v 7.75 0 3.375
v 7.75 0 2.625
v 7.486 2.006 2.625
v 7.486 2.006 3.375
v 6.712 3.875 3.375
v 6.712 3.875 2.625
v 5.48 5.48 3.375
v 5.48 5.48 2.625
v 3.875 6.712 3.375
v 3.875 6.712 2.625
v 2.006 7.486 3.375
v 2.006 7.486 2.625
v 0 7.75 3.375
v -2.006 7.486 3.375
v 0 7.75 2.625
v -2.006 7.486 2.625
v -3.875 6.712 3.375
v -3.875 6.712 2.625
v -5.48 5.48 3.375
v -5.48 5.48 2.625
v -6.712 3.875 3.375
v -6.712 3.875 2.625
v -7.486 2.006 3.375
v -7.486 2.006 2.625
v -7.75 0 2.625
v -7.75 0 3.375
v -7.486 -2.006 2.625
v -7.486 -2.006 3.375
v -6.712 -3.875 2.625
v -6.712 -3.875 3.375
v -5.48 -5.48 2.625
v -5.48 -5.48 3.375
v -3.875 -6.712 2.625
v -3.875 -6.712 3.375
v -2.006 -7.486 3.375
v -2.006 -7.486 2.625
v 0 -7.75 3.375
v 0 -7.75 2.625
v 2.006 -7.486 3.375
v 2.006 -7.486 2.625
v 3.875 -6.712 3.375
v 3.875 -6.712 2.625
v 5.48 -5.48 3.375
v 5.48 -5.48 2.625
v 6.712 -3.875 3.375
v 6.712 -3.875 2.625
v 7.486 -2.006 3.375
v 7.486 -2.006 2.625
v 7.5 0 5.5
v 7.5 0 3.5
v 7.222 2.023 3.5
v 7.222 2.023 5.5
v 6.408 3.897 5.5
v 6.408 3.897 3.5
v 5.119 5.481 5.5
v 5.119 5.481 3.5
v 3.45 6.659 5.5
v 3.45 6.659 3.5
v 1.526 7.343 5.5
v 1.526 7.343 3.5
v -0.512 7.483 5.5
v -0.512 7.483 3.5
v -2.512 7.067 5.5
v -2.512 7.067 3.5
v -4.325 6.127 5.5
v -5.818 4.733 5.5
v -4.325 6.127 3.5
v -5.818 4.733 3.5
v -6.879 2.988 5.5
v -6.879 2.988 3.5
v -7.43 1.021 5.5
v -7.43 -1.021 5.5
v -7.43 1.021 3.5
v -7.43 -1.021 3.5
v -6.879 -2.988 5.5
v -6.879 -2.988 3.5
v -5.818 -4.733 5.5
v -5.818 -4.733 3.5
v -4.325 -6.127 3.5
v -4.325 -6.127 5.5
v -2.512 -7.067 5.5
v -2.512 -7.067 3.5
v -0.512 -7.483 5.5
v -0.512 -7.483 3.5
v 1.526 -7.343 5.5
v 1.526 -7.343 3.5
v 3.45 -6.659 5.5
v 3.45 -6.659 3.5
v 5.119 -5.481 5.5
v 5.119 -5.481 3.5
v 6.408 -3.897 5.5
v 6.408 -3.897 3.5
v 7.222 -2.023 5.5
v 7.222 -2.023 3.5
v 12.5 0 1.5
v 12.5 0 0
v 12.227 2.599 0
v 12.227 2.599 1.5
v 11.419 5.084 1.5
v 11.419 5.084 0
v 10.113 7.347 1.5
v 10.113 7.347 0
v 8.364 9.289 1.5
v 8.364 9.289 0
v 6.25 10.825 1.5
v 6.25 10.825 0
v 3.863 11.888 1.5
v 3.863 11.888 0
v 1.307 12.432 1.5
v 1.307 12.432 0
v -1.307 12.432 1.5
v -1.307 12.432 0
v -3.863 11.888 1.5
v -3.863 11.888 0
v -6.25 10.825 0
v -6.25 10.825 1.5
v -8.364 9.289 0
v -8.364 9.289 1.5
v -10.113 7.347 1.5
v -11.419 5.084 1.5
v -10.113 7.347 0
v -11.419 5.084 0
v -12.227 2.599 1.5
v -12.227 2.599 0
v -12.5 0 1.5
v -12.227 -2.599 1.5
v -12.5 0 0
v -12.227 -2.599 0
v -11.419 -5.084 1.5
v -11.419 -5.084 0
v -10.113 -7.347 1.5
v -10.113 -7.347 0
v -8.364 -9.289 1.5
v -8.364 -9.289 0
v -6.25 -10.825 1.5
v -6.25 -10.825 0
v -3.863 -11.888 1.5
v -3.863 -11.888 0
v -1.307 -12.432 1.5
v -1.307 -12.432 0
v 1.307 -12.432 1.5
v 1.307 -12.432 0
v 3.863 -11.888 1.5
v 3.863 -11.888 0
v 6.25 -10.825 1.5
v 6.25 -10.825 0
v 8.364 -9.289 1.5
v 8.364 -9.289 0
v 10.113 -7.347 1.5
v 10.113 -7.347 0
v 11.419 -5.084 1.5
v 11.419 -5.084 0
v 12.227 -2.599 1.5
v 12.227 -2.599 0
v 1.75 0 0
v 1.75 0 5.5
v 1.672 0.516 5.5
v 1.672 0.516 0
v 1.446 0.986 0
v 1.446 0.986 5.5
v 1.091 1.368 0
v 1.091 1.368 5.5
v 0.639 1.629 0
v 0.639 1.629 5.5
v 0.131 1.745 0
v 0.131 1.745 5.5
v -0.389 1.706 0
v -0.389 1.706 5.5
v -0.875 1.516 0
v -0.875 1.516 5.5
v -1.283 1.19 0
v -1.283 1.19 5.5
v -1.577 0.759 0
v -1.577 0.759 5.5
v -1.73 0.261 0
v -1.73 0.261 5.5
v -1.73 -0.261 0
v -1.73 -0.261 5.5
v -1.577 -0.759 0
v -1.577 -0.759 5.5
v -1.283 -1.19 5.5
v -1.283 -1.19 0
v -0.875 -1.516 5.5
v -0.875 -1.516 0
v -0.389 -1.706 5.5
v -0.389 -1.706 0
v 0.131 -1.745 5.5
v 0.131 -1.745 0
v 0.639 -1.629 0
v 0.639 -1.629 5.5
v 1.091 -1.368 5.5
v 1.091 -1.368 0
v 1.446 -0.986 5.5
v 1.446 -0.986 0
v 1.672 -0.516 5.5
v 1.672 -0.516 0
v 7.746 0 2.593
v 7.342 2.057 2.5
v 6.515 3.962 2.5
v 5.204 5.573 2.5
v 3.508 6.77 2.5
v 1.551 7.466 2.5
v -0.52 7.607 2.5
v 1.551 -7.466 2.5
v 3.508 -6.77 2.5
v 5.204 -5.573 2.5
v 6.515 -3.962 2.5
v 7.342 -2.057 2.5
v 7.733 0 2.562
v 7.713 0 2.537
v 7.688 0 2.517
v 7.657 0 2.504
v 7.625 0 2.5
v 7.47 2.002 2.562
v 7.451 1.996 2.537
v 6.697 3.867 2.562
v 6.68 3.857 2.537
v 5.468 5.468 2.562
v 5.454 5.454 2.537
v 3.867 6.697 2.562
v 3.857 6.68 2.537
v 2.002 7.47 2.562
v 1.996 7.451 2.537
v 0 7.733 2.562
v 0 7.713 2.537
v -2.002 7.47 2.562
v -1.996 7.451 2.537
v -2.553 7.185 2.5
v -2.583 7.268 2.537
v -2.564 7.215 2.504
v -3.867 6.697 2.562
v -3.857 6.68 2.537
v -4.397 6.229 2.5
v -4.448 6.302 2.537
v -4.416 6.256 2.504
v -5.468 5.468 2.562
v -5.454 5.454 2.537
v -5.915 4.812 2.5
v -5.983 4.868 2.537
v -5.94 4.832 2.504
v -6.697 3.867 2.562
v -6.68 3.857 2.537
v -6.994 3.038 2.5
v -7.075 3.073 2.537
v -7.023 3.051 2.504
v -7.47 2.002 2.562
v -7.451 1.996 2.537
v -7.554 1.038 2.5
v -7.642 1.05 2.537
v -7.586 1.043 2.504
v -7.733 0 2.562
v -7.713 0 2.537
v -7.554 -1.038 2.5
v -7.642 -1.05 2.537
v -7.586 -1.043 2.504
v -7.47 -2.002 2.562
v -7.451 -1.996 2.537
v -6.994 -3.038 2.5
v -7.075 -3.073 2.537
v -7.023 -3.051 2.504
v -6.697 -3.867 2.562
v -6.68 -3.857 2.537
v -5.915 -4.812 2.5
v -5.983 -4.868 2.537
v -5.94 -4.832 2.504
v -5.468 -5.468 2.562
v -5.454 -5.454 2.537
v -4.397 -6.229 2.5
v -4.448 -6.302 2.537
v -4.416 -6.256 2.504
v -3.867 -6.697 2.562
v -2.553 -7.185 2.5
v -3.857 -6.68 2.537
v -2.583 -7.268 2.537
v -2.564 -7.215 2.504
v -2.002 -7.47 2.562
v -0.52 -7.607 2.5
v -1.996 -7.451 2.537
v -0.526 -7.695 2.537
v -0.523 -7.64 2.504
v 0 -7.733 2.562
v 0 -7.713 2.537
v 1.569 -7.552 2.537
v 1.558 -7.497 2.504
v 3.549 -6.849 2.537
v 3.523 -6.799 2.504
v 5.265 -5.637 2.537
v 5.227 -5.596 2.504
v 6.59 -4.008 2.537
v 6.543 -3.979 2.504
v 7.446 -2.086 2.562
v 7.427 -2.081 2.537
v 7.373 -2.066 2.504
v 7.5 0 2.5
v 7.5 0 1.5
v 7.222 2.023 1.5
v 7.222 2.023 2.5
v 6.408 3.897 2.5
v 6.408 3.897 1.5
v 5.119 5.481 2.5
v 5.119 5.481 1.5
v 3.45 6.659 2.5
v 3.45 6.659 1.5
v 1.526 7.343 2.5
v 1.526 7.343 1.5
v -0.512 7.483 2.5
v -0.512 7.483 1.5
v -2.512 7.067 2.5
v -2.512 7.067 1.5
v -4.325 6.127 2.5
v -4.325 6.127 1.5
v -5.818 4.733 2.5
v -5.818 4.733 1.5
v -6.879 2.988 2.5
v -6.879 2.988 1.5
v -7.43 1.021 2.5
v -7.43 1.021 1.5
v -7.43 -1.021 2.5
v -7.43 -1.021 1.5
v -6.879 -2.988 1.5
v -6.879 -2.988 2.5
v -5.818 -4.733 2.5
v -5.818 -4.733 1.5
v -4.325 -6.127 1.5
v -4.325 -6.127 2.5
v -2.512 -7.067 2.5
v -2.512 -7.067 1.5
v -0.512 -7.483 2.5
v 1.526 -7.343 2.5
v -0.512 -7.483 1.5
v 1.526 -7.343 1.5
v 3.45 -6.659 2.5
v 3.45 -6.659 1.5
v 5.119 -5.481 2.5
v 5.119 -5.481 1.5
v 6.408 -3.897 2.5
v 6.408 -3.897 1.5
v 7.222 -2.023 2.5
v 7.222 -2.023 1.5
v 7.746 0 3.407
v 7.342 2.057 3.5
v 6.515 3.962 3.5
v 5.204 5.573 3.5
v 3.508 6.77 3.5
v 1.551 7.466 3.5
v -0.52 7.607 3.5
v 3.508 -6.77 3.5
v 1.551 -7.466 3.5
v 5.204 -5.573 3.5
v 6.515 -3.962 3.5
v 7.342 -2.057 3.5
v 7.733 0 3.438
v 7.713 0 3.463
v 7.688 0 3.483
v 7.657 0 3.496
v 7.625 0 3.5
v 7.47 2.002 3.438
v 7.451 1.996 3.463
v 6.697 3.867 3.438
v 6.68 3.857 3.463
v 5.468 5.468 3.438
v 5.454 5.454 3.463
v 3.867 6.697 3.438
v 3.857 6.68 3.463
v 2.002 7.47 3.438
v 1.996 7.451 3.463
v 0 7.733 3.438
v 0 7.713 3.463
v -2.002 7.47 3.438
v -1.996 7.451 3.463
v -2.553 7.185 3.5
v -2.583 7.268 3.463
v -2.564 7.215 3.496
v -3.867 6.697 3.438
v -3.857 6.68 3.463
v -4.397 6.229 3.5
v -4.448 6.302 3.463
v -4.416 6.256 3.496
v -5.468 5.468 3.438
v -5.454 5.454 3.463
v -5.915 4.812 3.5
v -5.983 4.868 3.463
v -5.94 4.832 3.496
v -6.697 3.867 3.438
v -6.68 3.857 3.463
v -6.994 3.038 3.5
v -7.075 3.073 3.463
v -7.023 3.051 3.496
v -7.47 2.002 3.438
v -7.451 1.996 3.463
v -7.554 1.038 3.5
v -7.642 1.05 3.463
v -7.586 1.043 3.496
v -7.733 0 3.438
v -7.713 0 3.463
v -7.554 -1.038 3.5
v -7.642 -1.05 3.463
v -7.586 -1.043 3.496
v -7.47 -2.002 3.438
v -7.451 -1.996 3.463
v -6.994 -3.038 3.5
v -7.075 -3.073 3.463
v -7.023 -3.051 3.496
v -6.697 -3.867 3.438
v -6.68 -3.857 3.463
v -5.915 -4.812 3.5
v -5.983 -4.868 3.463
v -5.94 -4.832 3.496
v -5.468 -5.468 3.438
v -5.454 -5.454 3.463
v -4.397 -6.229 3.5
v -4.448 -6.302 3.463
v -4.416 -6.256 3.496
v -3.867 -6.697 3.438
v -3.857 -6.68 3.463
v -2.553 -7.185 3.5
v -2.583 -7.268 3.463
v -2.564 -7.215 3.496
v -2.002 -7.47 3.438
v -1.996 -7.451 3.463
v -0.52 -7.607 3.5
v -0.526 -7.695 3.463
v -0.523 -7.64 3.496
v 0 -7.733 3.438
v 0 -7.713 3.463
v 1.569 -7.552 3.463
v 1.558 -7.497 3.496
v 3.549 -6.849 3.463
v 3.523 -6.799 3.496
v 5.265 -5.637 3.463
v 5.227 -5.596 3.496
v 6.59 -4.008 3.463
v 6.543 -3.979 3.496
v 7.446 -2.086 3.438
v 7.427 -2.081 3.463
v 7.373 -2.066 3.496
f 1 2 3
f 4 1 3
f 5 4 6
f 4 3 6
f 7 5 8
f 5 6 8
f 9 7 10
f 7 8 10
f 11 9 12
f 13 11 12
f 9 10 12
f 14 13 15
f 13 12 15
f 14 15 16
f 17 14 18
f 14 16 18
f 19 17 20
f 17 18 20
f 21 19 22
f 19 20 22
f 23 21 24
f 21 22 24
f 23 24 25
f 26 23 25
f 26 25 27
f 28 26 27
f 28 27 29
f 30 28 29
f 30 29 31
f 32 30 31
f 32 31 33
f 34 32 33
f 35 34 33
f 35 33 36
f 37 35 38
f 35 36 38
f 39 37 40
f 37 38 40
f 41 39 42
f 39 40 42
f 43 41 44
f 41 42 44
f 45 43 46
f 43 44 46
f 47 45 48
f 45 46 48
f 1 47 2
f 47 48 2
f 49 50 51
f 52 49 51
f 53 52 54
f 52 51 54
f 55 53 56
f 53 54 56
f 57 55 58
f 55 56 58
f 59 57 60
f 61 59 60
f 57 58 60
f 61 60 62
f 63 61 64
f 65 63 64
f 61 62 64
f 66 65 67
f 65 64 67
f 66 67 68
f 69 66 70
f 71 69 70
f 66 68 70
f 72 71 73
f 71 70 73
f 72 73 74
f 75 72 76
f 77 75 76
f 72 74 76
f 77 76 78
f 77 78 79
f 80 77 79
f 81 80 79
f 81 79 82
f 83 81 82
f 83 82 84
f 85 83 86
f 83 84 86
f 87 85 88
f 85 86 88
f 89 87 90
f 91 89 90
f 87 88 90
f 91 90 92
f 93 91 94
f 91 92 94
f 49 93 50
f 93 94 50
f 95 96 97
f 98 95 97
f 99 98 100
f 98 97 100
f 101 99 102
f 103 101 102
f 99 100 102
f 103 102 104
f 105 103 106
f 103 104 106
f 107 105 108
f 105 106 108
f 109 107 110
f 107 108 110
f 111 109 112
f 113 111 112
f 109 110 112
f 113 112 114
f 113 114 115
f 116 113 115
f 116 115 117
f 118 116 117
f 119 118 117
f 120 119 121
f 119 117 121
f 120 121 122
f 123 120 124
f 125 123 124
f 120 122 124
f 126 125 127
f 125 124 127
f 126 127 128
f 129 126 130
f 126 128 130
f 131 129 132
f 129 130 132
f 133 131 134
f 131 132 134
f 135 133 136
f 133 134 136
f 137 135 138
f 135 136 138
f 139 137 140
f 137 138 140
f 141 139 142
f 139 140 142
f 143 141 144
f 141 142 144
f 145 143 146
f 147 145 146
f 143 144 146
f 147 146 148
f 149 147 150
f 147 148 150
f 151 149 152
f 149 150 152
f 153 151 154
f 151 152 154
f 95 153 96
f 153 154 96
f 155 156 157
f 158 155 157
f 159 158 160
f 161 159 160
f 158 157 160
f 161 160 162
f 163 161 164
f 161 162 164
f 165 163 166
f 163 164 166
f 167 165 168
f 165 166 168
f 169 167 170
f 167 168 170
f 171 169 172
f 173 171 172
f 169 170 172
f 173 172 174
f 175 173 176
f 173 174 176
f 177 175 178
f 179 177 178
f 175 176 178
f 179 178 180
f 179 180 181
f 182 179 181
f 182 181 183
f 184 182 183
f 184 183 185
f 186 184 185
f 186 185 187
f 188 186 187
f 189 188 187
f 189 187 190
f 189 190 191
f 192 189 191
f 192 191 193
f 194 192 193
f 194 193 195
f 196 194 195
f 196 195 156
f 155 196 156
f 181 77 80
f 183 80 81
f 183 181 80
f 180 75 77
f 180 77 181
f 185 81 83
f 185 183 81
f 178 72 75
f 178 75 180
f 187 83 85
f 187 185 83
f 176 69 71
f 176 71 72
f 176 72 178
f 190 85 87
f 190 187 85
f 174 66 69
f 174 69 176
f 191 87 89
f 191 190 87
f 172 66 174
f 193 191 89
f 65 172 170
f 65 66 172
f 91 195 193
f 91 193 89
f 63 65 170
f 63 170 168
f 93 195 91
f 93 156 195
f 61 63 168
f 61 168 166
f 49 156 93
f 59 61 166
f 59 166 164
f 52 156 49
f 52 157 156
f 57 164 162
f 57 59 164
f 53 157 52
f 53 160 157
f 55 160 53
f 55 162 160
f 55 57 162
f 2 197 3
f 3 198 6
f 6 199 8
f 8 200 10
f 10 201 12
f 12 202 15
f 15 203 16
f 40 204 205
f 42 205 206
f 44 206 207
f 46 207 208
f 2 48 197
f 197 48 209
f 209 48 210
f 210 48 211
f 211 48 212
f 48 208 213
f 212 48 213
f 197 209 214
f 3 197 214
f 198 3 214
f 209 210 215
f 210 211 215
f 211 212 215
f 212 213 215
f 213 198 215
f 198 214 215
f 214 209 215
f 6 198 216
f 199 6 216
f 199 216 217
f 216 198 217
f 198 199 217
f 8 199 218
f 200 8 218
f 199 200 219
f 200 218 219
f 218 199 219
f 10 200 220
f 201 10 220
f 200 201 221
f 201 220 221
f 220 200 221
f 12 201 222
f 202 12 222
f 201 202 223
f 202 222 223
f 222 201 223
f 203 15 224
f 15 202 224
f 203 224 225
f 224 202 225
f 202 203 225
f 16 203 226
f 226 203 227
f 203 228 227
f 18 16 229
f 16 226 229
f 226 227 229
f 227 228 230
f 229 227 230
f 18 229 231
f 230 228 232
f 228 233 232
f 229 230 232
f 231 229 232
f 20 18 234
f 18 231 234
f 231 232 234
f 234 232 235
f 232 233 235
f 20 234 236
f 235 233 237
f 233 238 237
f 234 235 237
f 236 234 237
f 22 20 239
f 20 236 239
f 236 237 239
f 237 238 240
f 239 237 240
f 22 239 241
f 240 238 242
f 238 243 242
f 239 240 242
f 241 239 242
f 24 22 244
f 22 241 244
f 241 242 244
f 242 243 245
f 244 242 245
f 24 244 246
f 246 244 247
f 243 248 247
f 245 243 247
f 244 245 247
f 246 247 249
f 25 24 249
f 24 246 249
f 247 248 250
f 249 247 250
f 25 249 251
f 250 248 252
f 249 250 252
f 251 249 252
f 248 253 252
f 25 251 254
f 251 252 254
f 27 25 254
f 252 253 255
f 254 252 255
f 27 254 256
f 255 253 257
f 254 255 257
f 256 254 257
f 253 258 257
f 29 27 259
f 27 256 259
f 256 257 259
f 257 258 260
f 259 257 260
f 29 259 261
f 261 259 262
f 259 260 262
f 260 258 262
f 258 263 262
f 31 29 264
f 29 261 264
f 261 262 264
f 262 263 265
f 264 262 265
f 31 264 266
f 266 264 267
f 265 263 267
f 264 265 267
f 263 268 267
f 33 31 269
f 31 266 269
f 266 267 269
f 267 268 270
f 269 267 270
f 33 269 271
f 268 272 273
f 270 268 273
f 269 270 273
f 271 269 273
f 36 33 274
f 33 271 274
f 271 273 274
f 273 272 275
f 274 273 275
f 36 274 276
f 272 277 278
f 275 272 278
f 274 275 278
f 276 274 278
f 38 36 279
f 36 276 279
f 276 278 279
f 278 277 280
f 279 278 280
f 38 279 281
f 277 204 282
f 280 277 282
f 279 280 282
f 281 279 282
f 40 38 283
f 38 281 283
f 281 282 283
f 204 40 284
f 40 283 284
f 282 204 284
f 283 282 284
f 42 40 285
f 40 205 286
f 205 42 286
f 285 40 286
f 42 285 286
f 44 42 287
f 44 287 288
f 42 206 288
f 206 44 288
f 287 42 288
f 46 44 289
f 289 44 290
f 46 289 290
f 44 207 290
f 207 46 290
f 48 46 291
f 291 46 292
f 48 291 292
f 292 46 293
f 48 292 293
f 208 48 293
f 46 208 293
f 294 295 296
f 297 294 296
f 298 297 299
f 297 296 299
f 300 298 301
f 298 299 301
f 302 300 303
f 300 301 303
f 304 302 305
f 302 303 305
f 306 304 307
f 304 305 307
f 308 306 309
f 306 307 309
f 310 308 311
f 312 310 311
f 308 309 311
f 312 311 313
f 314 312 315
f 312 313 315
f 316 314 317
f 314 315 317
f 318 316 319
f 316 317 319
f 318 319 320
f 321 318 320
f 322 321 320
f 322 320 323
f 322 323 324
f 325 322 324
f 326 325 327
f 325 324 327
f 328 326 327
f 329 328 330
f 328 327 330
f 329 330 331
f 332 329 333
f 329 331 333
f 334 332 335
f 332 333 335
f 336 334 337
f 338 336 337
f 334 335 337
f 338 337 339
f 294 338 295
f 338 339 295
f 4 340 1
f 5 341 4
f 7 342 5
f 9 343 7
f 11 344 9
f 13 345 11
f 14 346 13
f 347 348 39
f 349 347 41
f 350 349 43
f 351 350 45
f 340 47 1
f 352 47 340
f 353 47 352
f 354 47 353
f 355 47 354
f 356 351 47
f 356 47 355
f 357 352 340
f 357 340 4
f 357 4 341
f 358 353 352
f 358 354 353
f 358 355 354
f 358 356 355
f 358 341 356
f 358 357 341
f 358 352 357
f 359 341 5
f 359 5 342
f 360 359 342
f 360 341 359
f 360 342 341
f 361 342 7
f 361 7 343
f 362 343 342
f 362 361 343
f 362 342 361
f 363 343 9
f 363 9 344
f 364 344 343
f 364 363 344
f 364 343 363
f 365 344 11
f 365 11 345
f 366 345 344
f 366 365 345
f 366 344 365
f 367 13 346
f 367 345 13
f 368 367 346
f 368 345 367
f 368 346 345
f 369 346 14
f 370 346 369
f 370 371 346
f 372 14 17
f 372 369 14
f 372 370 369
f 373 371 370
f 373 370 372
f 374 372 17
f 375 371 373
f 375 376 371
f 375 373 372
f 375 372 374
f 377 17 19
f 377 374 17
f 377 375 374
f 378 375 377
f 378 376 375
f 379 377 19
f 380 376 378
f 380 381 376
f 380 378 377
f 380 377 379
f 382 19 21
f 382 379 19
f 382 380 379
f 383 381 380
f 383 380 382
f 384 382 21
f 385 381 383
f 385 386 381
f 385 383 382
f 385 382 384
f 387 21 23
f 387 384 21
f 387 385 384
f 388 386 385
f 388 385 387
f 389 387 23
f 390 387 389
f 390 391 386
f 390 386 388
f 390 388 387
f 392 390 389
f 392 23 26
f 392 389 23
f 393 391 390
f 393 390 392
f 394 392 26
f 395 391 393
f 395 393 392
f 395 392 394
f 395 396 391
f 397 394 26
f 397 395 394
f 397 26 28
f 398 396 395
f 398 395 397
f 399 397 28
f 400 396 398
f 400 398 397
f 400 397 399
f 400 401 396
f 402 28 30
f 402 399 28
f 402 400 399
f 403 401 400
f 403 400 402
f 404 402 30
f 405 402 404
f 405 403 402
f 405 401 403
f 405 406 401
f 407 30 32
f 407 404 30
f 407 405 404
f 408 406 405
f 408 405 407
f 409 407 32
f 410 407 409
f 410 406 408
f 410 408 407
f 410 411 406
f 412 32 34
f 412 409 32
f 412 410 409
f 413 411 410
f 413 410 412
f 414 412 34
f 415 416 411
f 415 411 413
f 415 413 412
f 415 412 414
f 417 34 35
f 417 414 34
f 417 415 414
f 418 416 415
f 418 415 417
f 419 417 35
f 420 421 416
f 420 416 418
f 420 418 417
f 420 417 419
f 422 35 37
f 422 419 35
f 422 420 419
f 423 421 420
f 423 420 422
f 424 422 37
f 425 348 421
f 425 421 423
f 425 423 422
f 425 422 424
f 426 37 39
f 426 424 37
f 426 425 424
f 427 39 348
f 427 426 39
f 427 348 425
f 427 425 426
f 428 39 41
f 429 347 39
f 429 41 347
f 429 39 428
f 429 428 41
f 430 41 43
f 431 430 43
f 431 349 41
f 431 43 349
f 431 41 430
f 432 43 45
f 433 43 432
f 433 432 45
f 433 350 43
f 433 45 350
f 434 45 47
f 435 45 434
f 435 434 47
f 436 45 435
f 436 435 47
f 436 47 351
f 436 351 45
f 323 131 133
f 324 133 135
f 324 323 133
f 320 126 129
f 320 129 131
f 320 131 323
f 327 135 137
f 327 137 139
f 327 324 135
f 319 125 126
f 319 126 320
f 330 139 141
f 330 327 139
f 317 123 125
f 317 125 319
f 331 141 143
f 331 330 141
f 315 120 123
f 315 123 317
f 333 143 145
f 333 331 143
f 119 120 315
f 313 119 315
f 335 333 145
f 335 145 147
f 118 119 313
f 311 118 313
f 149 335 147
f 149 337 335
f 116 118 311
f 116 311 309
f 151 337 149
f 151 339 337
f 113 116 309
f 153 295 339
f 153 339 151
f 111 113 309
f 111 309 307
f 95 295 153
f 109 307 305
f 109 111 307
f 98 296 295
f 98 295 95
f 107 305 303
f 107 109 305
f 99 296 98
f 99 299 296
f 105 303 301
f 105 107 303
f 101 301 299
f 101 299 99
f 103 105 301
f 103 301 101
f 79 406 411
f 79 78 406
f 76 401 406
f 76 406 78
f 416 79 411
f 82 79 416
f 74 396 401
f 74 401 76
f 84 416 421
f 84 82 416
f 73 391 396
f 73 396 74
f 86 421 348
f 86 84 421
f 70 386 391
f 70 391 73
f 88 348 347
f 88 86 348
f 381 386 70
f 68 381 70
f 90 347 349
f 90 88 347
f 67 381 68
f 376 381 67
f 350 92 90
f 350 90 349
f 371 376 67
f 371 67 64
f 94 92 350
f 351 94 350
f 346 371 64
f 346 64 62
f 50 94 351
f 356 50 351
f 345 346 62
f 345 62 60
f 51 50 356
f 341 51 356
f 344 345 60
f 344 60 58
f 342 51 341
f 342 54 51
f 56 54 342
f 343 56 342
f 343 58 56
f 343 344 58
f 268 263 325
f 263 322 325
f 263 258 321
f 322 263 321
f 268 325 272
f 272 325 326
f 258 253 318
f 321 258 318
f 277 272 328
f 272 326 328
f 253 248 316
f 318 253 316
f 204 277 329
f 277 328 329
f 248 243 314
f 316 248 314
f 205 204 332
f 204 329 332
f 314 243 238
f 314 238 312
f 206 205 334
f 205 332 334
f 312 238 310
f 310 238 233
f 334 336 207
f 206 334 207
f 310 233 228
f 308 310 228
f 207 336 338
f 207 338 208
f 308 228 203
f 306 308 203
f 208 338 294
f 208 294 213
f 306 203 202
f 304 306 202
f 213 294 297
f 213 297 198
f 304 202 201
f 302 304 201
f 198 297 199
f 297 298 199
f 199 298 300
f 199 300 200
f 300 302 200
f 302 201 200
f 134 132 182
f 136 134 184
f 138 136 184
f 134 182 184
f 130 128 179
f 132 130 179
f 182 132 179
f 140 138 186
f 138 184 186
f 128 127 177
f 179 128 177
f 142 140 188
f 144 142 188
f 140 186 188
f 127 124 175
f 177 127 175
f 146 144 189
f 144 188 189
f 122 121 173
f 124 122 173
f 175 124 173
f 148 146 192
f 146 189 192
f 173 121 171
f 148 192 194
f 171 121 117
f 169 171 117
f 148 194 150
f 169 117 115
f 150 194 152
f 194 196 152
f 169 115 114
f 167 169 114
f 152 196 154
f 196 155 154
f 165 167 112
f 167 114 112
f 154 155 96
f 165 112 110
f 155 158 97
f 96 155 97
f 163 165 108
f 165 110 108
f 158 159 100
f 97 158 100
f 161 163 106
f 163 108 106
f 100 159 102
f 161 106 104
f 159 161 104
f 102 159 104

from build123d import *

# Parameters (mm, degrees)
F0_R      = 12.5
F1_DEPTH  = 1.5
F2_R      = 7.5
F3_DEPTH  = 1
F4_R      = 7.75
F5_DEPTH  = 1
F6_R      = 7.5
F7_DEPTH  = 2
F9_R      = 1.75
F10_DEPTH = 5.501
F11_R     = 0.125


with BuildPart() as f1:
    # F0 (on Top) → F1 (new body)
    with BuildSketch(Plane.XY):
        Circle(F0_R)
    extrude(amount=F1_DEPTH)

    # F2 (on face) → F3 (join)
    with BuildSketch(Plane.XY.offset(1.5)):
        Circle(F2_R)
    extrude(amount=F3_DEPTH)

    # F4 (on face) → F5 (join)
    with BuildSketch(Plane.XY.offset(2.5)):
        Circle(F4_R)
    extrude(amount=F5_DEPTH)

    # F6 (on face) → F7 (join)
    with BuildSketch(Plane.XY.offset(3.5)):
        Circle(F6_R)
    extrude(amount=F7_DEPTH)

    # F9 (on face) → F10 (cut, through all)
    with BuildSketch(Plane.XY.offset(5.5)):
        Circle(F9_R)
    extrude(amount=-F10_DEPTH, mode=Mode.SUBTRACT)

    # F11
    f11_edges = [f1.edges().sort_by_distance(p)[0] for p in [
        (-7.75, 0, 3.5),
        (-7.75, 0, 2.5),
    ]]
    fillet(f11_edges, radius=F11_R)


solid = f1.part
